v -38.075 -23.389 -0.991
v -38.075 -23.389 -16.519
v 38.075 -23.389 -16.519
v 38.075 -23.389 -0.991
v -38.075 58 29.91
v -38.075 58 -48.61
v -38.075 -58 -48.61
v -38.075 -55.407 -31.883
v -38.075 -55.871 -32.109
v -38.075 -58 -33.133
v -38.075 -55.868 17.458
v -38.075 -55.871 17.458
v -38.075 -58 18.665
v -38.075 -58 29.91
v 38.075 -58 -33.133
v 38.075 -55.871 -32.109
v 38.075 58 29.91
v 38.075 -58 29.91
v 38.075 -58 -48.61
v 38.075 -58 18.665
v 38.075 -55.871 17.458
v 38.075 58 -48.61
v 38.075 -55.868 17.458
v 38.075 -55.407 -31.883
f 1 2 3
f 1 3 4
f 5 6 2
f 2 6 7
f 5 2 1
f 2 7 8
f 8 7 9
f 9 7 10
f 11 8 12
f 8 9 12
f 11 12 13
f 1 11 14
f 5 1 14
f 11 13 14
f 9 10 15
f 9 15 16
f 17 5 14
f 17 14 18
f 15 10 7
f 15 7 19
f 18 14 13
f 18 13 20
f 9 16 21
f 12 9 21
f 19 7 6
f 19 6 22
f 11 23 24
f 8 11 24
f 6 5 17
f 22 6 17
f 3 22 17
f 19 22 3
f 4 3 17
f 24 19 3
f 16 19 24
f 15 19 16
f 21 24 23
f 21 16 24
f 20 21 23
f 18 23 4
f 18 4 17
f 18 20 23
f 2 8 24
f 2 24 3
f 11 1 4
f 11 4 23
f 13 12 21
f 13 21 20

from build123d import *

# Parameters (mm, degrees)
F0_W     = 76.149322
F0_H     = 97.219742
F1_DEPTH = 58
F2_W     = 76.149322
F2_H     = 116
F3_DEPTH = 18.7
F5_DEPTH = 123.1
F7_DEPTH = 89.5


with BuildPart() as f1:
    # F0 (on Front) → F1 (new body, symmetric)
    with BuildSketch(Plane.XZ):
        Rectangle(F0_W, F0_H)
    extrude(amount=F1_DEPTH, both=True)

    # F2 (on face) → F3 (cut)
    with BuildSketch(Plane.XY.offset(48.609871)):
        Rectangle(F2_W, F2_H)
    extrude(amount=-F3_DEPTH, mode=Mode.SUBTRACT)

    # F4 (on Right) → F5 (cut, symmetric)
    with BuildSketch(Plane.YZ):
        Polygon((-23.388904, -0.990585), (-55.867601, 17.457999), (-55.406615, -31.883165), (-23.388904, -16.519183), align=None)
    extrude(amount=F5_DEPTH, both=True, mode=Mode.SUBTRACT)

    # F6 (on Right) → F7 (cut, symmetric)
    with BuildSketch(Plane.YZ):
        Polygon((-55.870809, 17.301733), (-55.870809, 17.458142), (-58.005538, 18.668221), (-58.056336, -33.160523), (-55.870809, -32.10915), align=None)
    extrude(amount=F7_DEPTH, both=True, mode=Mode.SUBTRACT)


solid = f1.part
